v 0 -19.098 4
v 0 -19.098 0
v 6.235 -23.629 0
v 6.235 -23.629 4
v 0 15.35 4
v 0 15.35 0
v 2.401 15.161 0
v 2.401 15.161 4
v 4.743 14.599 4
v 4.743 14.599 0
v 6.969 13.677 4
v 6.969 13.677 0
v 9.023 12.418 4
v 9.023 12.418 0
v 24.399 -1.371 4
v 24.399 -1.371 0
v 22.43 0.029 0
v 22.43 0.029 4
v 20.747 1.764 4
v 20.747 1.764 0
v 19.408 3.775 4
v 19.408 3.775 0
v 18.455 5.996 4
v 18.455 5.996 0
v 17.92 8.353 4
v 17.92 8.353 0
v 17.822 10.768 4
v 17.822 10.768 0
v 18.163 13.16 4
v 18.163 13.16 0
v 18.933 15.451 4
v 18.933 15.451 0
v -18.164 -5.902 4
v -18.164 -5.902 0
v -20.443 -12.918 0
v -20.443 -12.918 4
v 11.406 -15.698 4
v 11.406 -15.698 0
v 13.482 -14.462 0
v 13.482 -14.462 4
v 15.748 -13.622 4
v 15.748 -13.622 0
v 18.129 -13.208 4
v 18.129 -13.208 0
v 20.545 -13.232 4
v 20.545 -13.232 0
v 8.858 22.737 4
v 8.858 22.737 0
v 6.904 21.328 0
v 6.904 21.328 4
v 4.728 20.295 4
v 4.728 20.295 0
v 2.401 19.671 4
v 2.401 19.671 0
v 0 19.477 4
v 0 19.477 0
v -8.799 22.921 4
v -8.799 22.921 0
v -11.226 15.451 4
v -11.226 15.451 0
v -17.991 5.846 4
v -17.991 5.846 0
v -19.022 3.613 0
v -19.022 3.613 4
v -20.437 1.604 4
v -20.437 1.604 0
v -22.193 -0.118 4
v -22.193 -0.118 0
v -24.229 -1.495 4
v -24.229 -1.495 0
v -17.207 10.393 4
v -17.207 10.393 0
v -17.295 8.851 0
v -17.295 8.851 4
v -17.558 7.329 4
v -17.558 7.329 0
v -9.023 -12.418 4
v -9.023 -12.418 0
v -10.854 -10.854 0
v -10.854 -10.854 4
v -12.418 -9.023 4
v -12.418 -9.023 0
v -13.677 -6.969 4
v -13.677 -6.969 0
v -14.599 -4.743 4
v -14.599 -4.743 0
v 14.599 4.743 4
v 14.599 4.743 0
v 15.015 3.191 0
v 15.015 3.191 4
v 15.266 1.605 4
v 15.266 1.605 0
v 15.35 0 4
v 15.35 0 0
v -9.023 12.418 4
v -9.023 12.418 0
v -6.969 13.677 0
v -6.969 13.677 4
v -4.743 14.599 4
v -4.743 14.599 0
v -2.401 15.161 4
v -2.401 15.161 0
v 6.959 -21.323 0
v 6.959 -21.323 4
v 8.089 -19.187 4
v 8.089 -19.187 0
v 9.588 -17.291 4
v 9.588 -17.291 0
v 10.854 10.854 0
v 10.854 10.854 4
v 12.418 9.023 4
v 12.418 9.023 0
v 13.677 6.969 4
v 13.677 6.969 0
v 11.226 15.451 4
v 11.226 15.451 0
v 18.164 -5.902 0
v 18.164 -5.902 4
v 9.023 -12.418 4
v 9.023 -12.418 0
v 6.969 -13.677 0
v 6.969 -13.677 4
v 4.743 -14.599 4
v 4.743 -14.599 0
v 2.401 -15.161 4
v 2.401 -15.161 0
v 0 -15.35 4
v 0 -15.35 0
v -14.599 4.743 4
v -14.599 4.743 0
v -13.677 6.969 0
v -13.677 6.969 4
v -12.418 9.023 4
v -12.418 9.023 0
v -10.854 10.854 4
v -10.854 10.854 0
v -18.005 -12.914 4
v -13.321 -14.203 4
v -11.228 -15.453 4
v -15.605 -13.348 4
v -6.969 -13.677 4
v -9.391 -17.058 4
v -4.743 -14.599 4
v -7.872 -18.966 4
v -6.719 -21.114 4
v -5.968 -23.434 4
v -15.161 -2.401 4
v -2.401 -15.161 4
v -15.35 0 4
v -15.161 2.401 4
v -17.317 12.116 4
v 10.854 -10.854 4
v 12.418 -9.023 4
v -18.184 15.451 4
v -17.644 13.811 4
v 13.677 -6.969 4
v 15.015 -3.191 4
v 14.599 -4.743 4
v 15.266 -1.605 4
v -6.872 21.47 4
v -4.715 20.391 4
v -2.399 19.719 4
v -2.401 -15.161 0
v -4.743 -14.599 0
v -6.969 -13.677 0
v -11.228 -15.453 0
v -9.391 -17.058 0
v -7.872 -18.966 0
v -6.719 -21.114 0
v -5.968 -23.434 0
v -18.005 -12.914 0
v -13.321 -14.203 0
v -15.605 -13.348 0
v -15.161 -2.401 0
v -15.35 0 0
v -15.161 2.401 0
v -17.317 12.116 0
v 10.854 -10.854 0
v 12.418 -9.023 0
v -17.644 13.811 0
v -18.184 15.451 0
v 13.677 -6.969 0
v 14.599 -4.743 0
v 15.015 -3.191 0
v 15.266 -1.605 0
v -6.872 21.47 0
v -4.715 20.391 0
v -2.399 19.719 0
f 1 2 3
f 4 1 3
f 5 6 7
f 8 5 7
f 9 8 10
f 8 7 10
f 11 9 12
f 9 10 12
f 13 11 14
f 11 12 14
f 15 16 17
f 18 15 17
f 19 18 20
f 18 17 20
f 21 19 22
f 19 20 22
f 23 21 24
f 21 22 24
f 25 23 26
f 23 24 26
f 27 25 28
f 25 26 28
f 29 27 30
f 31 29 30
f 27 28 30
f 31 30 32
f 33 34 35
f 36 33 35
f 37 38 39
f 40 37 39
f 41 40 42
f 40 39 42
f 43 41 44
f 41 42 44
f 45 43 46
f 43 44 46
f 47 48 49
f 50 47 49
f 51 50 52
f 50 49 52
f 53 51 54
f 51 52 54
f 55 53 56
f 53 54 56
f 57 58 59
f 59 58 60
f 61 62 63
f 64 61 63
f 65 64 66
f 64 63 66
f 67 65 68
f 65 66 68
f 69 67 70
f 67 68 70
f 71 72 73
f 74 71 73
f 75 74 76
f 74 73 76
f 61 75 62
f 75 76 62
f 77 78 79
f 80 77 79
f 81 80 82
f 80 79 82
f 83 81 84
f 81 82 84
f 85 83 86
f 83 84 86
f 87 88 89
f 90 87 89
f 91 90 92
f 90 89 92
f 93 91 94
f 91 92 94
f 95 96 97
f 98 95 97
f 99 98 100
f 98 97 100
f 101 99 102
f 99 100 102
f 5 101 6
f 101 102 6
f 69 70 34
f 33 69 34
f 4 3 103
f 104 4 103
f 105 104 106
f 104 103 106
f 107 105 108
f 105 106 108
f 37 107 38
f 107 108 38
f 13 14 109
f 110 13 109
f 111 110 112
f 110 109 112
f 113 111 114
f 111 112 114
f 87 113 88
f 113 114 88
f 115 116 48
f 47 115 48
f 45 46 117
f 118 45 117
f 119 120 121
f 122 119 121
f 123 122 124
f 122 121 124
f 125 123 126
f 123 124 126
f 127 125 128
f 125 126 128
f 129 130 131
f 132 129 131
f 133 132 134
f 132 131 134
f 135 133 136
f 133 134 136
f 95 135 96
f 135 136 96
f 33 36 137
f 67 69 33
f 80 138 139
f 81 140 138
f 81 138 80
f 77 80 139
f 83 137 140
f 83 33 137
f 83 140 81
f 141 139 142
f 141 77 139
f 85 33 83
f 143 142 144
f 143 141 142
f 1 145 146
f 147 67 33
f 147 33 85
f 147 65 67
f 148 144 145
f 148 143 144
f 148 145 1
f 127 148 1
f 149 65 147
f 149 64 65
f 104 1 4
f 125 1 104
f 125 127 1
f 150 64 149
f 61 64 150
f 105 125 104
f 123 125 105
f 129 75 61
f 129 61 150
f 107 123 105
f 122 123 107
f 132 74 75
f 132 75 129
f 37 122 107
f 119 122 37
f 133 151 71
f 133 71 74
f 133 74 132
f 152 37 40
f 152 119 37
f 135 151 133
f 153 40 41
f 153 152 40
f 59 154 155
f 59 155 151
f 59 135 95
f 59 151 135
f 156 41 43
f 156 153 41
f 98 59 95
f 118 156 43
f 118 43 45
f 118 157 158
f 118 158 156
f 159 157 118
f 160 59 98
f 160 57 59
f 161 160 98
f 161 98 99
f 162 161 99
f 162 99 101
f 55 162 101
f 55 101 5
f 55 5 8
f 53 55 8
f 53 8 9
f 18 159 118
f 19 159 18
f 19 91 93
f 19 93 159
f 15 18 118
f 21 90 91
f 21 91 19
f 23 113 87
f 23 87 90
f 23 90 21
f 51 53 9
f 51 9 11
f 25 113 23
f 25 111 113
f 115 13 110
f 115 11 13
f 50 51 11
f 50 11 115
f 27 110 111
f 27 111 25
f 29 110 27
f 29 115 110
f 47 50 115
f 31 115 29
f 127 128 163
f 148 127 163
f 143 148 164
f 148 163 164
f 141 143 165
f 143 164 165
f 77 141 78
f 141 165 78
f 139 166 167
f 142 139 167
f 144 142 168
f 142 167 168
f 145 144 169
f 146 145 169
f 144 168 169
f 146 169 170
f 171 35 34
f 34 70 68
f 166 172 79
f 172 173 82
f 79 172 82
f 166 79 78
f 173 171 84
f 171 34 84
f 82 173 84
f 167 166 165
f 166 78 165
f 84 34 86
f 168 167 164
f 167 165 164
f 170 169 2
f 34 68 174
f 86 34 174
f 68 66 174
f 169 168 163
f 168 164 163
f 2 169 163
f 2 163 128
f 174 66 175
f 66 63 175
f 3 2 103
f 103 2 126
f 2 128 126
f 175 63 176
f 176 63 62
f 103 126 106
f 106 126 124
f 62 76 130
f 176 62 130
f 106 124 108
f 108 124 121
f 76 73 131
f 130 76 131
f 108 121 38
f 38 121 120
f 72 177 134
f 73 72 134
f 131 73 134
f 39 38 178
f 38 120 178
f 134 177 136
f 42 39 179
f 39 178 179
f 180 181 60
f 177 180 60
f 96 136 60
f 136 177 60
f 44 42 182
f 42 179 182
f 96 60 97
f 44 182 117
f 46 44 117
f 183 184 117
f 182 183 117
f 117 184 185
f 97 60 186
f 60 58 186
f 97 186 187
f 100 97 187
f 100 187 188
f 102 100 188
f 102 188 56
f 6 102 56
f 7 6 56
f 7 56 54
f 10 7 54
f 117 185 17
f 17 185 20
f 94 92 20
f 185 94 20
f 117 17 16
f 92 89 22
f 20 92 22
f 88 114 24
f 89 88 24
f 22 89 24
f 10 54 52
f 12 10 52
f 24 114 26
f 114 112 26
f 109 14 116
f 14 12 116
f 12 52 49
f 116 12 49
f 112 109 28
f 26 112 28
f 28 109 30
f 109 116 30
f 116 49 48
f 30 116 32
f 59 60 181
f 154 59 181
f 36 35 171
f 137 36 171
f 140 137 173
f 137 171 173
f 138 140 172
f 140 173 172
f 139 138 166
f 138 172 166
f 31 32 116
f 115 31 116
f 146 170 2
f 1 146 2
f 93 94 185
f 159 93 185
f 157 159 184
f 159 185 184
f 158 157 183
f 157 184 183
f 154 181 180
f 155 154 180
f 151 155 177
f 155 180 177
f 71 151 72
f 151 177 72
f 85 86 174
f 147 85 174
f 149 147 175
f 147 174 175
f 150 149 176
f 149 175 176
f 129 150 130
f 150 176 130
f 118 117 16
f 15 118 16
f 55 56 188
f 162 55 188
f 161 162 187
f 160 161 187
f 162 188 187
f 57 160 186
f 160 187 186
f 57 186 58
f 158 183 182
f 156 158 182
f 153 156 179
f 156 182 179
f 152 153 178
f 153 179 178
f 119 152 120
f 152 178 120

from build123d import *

# Parameters (mm, degrees)
F1_DEPTH = 4


# Not quite as in the source:
# - a feature names something its author has since deleted; it is built from what else it names


with BuildPart() as f1:
    # F0 (on Top) → F1 (new body)
    with BuildSketch(Plane.XY):
        with BuildLine():
            ThreePointArc((-20.4431954222, -12.9176859982), (-15.6048127823, -13.347574962), (-11.2276054917, -15.453473209))
            ThreePointArc((-11.2276054917, -15.453473209), (-7.8721458006, -18.9656863791), (-5.9681546392, -23.4344187216))
            Line((-5.9681546392, -23.4344187216), (0, -19.0983005625))
            Line((0, -19.0983005625), (6.2352903352, -23.6285041655))
            ThreePointArc((6.2352903352, -23.6285041655), (8.0892727444, -19.1867619995), (11.4055803613, -15.6984346018))
            ThreePointArc((11.4055803613, -15.6984346018), (15.747972276, -13.6223910806), (20.5452321785, -13.2317228431))
            Line((20.5452321785, -13.2317228431), (18.1635632001, -5.9016994375))
            Line((18.1635632001, -5.9016994375), (24.3988535354, -1.3714958345))
            ThreePointArc((24.3988535354, -1.3714958345), (18.4546166861, 5.9962684477), (18.9329421283, 15.4508497187))
            Line((18.9329421283, 15.4508497187), (15.537885835, 15.4508497187))
            Line((15.537885835, 15.4508497187), (11.2256994145, 15.4508497187))
            Line((11.2256994145, 15.4508497187), (8.8582927724, 22.7369781668))
            ThreePointArc((8.8582927724, 22.7369781668), (4.7280277023, 20.2947827391), (0, 19.4767594488))
            ThreePointArc((0, 19.4767594488), (-4.7153721091, 20.3911605121), (-8.7986573229, 22.920517208))
            Line((-8.7986573229, 22.920517208), (-11.2256994145, 15.4508497187))
            Line((-11.2256994145, 15.4508497187), (-18.184390629, 15.4508497187))
            ThreePointArc((-18.184390629, 15.4508497187), (-17.4535891597, 12.9689141671), (-17.2070021976, 10.3934006765))
            ThreePointArc((-17.2070021976, 10.3934006765), (-17.4045597984, 8.086010366), (-17.9914818172, 5.8457868068))
            ThreePointArc((-17.9914818172, 5.8457868068), (-20.4374126709, 1.6036270131), (-24.2294812931, -1.4945519715))
            Line((-24.2294812931, -1.4945519715), (-18.1635632001, -5.9016994375))
            Line((-18.1635632001, -5.9016994375), (-20.4431954222, -12.9176859982))
        make_face()
        with BuildLine():
            ThreePointArc((14.5987175251, 4.7434108637), (15.1610160281, 2.4012690384), (15.35, 0))
            ThreePointArc((15.35, 0), (15.1610160281, -2.4012690384), (14.5987175251, -4.7434108637))
            ThreePointArc((14.5987175251, -4.7434108637), (12.4184108637, -9.0225036227), (9.0225036227, -12.4184108637))
            ThreePointArc((9.0225036227, -12.4184108637), (4.7434108637, -14.5987175251), (0, -15.35))
            ThreePointArc((0, -15.35), (-4.7434108637, -14.5987175251), (-9.0225036227, -12.4184108637))
            ThreePointArc((-9.0225036227, -12.4184108637), (-12.4184108637, -9.0225036227), (-14.5987175251, -4.7434108637))
            ThreePointArc((-14.5987175251, -4.7434108637), (-15.35, 0), (-14.5987175251, 4.7434108637))
            ThreePointArc((-14.5987175251, 4.7434108637), (-12.4184108637, 9.0225036227), (-9.0225036227, 12.4184108637))
            ThreePointArc((-9.0225036227, 12.4184108637), (-4.7434108637, 14.5987175251), (0, 15.35))
            ThreePointArc((0, 15.35), (4.7434108637, 14.5987175251), (9.0225036227, 12.4184108637))
            ThreePointArc((9.0225036227, 12.4184108637), (12.4184108637, 9.0225036227), (14.5987175251, 4.7434108637))
        make_face(mode=Mode.SUBTRACT)
    extrude(amount=F1_DEPTH)


solid = f1.part
